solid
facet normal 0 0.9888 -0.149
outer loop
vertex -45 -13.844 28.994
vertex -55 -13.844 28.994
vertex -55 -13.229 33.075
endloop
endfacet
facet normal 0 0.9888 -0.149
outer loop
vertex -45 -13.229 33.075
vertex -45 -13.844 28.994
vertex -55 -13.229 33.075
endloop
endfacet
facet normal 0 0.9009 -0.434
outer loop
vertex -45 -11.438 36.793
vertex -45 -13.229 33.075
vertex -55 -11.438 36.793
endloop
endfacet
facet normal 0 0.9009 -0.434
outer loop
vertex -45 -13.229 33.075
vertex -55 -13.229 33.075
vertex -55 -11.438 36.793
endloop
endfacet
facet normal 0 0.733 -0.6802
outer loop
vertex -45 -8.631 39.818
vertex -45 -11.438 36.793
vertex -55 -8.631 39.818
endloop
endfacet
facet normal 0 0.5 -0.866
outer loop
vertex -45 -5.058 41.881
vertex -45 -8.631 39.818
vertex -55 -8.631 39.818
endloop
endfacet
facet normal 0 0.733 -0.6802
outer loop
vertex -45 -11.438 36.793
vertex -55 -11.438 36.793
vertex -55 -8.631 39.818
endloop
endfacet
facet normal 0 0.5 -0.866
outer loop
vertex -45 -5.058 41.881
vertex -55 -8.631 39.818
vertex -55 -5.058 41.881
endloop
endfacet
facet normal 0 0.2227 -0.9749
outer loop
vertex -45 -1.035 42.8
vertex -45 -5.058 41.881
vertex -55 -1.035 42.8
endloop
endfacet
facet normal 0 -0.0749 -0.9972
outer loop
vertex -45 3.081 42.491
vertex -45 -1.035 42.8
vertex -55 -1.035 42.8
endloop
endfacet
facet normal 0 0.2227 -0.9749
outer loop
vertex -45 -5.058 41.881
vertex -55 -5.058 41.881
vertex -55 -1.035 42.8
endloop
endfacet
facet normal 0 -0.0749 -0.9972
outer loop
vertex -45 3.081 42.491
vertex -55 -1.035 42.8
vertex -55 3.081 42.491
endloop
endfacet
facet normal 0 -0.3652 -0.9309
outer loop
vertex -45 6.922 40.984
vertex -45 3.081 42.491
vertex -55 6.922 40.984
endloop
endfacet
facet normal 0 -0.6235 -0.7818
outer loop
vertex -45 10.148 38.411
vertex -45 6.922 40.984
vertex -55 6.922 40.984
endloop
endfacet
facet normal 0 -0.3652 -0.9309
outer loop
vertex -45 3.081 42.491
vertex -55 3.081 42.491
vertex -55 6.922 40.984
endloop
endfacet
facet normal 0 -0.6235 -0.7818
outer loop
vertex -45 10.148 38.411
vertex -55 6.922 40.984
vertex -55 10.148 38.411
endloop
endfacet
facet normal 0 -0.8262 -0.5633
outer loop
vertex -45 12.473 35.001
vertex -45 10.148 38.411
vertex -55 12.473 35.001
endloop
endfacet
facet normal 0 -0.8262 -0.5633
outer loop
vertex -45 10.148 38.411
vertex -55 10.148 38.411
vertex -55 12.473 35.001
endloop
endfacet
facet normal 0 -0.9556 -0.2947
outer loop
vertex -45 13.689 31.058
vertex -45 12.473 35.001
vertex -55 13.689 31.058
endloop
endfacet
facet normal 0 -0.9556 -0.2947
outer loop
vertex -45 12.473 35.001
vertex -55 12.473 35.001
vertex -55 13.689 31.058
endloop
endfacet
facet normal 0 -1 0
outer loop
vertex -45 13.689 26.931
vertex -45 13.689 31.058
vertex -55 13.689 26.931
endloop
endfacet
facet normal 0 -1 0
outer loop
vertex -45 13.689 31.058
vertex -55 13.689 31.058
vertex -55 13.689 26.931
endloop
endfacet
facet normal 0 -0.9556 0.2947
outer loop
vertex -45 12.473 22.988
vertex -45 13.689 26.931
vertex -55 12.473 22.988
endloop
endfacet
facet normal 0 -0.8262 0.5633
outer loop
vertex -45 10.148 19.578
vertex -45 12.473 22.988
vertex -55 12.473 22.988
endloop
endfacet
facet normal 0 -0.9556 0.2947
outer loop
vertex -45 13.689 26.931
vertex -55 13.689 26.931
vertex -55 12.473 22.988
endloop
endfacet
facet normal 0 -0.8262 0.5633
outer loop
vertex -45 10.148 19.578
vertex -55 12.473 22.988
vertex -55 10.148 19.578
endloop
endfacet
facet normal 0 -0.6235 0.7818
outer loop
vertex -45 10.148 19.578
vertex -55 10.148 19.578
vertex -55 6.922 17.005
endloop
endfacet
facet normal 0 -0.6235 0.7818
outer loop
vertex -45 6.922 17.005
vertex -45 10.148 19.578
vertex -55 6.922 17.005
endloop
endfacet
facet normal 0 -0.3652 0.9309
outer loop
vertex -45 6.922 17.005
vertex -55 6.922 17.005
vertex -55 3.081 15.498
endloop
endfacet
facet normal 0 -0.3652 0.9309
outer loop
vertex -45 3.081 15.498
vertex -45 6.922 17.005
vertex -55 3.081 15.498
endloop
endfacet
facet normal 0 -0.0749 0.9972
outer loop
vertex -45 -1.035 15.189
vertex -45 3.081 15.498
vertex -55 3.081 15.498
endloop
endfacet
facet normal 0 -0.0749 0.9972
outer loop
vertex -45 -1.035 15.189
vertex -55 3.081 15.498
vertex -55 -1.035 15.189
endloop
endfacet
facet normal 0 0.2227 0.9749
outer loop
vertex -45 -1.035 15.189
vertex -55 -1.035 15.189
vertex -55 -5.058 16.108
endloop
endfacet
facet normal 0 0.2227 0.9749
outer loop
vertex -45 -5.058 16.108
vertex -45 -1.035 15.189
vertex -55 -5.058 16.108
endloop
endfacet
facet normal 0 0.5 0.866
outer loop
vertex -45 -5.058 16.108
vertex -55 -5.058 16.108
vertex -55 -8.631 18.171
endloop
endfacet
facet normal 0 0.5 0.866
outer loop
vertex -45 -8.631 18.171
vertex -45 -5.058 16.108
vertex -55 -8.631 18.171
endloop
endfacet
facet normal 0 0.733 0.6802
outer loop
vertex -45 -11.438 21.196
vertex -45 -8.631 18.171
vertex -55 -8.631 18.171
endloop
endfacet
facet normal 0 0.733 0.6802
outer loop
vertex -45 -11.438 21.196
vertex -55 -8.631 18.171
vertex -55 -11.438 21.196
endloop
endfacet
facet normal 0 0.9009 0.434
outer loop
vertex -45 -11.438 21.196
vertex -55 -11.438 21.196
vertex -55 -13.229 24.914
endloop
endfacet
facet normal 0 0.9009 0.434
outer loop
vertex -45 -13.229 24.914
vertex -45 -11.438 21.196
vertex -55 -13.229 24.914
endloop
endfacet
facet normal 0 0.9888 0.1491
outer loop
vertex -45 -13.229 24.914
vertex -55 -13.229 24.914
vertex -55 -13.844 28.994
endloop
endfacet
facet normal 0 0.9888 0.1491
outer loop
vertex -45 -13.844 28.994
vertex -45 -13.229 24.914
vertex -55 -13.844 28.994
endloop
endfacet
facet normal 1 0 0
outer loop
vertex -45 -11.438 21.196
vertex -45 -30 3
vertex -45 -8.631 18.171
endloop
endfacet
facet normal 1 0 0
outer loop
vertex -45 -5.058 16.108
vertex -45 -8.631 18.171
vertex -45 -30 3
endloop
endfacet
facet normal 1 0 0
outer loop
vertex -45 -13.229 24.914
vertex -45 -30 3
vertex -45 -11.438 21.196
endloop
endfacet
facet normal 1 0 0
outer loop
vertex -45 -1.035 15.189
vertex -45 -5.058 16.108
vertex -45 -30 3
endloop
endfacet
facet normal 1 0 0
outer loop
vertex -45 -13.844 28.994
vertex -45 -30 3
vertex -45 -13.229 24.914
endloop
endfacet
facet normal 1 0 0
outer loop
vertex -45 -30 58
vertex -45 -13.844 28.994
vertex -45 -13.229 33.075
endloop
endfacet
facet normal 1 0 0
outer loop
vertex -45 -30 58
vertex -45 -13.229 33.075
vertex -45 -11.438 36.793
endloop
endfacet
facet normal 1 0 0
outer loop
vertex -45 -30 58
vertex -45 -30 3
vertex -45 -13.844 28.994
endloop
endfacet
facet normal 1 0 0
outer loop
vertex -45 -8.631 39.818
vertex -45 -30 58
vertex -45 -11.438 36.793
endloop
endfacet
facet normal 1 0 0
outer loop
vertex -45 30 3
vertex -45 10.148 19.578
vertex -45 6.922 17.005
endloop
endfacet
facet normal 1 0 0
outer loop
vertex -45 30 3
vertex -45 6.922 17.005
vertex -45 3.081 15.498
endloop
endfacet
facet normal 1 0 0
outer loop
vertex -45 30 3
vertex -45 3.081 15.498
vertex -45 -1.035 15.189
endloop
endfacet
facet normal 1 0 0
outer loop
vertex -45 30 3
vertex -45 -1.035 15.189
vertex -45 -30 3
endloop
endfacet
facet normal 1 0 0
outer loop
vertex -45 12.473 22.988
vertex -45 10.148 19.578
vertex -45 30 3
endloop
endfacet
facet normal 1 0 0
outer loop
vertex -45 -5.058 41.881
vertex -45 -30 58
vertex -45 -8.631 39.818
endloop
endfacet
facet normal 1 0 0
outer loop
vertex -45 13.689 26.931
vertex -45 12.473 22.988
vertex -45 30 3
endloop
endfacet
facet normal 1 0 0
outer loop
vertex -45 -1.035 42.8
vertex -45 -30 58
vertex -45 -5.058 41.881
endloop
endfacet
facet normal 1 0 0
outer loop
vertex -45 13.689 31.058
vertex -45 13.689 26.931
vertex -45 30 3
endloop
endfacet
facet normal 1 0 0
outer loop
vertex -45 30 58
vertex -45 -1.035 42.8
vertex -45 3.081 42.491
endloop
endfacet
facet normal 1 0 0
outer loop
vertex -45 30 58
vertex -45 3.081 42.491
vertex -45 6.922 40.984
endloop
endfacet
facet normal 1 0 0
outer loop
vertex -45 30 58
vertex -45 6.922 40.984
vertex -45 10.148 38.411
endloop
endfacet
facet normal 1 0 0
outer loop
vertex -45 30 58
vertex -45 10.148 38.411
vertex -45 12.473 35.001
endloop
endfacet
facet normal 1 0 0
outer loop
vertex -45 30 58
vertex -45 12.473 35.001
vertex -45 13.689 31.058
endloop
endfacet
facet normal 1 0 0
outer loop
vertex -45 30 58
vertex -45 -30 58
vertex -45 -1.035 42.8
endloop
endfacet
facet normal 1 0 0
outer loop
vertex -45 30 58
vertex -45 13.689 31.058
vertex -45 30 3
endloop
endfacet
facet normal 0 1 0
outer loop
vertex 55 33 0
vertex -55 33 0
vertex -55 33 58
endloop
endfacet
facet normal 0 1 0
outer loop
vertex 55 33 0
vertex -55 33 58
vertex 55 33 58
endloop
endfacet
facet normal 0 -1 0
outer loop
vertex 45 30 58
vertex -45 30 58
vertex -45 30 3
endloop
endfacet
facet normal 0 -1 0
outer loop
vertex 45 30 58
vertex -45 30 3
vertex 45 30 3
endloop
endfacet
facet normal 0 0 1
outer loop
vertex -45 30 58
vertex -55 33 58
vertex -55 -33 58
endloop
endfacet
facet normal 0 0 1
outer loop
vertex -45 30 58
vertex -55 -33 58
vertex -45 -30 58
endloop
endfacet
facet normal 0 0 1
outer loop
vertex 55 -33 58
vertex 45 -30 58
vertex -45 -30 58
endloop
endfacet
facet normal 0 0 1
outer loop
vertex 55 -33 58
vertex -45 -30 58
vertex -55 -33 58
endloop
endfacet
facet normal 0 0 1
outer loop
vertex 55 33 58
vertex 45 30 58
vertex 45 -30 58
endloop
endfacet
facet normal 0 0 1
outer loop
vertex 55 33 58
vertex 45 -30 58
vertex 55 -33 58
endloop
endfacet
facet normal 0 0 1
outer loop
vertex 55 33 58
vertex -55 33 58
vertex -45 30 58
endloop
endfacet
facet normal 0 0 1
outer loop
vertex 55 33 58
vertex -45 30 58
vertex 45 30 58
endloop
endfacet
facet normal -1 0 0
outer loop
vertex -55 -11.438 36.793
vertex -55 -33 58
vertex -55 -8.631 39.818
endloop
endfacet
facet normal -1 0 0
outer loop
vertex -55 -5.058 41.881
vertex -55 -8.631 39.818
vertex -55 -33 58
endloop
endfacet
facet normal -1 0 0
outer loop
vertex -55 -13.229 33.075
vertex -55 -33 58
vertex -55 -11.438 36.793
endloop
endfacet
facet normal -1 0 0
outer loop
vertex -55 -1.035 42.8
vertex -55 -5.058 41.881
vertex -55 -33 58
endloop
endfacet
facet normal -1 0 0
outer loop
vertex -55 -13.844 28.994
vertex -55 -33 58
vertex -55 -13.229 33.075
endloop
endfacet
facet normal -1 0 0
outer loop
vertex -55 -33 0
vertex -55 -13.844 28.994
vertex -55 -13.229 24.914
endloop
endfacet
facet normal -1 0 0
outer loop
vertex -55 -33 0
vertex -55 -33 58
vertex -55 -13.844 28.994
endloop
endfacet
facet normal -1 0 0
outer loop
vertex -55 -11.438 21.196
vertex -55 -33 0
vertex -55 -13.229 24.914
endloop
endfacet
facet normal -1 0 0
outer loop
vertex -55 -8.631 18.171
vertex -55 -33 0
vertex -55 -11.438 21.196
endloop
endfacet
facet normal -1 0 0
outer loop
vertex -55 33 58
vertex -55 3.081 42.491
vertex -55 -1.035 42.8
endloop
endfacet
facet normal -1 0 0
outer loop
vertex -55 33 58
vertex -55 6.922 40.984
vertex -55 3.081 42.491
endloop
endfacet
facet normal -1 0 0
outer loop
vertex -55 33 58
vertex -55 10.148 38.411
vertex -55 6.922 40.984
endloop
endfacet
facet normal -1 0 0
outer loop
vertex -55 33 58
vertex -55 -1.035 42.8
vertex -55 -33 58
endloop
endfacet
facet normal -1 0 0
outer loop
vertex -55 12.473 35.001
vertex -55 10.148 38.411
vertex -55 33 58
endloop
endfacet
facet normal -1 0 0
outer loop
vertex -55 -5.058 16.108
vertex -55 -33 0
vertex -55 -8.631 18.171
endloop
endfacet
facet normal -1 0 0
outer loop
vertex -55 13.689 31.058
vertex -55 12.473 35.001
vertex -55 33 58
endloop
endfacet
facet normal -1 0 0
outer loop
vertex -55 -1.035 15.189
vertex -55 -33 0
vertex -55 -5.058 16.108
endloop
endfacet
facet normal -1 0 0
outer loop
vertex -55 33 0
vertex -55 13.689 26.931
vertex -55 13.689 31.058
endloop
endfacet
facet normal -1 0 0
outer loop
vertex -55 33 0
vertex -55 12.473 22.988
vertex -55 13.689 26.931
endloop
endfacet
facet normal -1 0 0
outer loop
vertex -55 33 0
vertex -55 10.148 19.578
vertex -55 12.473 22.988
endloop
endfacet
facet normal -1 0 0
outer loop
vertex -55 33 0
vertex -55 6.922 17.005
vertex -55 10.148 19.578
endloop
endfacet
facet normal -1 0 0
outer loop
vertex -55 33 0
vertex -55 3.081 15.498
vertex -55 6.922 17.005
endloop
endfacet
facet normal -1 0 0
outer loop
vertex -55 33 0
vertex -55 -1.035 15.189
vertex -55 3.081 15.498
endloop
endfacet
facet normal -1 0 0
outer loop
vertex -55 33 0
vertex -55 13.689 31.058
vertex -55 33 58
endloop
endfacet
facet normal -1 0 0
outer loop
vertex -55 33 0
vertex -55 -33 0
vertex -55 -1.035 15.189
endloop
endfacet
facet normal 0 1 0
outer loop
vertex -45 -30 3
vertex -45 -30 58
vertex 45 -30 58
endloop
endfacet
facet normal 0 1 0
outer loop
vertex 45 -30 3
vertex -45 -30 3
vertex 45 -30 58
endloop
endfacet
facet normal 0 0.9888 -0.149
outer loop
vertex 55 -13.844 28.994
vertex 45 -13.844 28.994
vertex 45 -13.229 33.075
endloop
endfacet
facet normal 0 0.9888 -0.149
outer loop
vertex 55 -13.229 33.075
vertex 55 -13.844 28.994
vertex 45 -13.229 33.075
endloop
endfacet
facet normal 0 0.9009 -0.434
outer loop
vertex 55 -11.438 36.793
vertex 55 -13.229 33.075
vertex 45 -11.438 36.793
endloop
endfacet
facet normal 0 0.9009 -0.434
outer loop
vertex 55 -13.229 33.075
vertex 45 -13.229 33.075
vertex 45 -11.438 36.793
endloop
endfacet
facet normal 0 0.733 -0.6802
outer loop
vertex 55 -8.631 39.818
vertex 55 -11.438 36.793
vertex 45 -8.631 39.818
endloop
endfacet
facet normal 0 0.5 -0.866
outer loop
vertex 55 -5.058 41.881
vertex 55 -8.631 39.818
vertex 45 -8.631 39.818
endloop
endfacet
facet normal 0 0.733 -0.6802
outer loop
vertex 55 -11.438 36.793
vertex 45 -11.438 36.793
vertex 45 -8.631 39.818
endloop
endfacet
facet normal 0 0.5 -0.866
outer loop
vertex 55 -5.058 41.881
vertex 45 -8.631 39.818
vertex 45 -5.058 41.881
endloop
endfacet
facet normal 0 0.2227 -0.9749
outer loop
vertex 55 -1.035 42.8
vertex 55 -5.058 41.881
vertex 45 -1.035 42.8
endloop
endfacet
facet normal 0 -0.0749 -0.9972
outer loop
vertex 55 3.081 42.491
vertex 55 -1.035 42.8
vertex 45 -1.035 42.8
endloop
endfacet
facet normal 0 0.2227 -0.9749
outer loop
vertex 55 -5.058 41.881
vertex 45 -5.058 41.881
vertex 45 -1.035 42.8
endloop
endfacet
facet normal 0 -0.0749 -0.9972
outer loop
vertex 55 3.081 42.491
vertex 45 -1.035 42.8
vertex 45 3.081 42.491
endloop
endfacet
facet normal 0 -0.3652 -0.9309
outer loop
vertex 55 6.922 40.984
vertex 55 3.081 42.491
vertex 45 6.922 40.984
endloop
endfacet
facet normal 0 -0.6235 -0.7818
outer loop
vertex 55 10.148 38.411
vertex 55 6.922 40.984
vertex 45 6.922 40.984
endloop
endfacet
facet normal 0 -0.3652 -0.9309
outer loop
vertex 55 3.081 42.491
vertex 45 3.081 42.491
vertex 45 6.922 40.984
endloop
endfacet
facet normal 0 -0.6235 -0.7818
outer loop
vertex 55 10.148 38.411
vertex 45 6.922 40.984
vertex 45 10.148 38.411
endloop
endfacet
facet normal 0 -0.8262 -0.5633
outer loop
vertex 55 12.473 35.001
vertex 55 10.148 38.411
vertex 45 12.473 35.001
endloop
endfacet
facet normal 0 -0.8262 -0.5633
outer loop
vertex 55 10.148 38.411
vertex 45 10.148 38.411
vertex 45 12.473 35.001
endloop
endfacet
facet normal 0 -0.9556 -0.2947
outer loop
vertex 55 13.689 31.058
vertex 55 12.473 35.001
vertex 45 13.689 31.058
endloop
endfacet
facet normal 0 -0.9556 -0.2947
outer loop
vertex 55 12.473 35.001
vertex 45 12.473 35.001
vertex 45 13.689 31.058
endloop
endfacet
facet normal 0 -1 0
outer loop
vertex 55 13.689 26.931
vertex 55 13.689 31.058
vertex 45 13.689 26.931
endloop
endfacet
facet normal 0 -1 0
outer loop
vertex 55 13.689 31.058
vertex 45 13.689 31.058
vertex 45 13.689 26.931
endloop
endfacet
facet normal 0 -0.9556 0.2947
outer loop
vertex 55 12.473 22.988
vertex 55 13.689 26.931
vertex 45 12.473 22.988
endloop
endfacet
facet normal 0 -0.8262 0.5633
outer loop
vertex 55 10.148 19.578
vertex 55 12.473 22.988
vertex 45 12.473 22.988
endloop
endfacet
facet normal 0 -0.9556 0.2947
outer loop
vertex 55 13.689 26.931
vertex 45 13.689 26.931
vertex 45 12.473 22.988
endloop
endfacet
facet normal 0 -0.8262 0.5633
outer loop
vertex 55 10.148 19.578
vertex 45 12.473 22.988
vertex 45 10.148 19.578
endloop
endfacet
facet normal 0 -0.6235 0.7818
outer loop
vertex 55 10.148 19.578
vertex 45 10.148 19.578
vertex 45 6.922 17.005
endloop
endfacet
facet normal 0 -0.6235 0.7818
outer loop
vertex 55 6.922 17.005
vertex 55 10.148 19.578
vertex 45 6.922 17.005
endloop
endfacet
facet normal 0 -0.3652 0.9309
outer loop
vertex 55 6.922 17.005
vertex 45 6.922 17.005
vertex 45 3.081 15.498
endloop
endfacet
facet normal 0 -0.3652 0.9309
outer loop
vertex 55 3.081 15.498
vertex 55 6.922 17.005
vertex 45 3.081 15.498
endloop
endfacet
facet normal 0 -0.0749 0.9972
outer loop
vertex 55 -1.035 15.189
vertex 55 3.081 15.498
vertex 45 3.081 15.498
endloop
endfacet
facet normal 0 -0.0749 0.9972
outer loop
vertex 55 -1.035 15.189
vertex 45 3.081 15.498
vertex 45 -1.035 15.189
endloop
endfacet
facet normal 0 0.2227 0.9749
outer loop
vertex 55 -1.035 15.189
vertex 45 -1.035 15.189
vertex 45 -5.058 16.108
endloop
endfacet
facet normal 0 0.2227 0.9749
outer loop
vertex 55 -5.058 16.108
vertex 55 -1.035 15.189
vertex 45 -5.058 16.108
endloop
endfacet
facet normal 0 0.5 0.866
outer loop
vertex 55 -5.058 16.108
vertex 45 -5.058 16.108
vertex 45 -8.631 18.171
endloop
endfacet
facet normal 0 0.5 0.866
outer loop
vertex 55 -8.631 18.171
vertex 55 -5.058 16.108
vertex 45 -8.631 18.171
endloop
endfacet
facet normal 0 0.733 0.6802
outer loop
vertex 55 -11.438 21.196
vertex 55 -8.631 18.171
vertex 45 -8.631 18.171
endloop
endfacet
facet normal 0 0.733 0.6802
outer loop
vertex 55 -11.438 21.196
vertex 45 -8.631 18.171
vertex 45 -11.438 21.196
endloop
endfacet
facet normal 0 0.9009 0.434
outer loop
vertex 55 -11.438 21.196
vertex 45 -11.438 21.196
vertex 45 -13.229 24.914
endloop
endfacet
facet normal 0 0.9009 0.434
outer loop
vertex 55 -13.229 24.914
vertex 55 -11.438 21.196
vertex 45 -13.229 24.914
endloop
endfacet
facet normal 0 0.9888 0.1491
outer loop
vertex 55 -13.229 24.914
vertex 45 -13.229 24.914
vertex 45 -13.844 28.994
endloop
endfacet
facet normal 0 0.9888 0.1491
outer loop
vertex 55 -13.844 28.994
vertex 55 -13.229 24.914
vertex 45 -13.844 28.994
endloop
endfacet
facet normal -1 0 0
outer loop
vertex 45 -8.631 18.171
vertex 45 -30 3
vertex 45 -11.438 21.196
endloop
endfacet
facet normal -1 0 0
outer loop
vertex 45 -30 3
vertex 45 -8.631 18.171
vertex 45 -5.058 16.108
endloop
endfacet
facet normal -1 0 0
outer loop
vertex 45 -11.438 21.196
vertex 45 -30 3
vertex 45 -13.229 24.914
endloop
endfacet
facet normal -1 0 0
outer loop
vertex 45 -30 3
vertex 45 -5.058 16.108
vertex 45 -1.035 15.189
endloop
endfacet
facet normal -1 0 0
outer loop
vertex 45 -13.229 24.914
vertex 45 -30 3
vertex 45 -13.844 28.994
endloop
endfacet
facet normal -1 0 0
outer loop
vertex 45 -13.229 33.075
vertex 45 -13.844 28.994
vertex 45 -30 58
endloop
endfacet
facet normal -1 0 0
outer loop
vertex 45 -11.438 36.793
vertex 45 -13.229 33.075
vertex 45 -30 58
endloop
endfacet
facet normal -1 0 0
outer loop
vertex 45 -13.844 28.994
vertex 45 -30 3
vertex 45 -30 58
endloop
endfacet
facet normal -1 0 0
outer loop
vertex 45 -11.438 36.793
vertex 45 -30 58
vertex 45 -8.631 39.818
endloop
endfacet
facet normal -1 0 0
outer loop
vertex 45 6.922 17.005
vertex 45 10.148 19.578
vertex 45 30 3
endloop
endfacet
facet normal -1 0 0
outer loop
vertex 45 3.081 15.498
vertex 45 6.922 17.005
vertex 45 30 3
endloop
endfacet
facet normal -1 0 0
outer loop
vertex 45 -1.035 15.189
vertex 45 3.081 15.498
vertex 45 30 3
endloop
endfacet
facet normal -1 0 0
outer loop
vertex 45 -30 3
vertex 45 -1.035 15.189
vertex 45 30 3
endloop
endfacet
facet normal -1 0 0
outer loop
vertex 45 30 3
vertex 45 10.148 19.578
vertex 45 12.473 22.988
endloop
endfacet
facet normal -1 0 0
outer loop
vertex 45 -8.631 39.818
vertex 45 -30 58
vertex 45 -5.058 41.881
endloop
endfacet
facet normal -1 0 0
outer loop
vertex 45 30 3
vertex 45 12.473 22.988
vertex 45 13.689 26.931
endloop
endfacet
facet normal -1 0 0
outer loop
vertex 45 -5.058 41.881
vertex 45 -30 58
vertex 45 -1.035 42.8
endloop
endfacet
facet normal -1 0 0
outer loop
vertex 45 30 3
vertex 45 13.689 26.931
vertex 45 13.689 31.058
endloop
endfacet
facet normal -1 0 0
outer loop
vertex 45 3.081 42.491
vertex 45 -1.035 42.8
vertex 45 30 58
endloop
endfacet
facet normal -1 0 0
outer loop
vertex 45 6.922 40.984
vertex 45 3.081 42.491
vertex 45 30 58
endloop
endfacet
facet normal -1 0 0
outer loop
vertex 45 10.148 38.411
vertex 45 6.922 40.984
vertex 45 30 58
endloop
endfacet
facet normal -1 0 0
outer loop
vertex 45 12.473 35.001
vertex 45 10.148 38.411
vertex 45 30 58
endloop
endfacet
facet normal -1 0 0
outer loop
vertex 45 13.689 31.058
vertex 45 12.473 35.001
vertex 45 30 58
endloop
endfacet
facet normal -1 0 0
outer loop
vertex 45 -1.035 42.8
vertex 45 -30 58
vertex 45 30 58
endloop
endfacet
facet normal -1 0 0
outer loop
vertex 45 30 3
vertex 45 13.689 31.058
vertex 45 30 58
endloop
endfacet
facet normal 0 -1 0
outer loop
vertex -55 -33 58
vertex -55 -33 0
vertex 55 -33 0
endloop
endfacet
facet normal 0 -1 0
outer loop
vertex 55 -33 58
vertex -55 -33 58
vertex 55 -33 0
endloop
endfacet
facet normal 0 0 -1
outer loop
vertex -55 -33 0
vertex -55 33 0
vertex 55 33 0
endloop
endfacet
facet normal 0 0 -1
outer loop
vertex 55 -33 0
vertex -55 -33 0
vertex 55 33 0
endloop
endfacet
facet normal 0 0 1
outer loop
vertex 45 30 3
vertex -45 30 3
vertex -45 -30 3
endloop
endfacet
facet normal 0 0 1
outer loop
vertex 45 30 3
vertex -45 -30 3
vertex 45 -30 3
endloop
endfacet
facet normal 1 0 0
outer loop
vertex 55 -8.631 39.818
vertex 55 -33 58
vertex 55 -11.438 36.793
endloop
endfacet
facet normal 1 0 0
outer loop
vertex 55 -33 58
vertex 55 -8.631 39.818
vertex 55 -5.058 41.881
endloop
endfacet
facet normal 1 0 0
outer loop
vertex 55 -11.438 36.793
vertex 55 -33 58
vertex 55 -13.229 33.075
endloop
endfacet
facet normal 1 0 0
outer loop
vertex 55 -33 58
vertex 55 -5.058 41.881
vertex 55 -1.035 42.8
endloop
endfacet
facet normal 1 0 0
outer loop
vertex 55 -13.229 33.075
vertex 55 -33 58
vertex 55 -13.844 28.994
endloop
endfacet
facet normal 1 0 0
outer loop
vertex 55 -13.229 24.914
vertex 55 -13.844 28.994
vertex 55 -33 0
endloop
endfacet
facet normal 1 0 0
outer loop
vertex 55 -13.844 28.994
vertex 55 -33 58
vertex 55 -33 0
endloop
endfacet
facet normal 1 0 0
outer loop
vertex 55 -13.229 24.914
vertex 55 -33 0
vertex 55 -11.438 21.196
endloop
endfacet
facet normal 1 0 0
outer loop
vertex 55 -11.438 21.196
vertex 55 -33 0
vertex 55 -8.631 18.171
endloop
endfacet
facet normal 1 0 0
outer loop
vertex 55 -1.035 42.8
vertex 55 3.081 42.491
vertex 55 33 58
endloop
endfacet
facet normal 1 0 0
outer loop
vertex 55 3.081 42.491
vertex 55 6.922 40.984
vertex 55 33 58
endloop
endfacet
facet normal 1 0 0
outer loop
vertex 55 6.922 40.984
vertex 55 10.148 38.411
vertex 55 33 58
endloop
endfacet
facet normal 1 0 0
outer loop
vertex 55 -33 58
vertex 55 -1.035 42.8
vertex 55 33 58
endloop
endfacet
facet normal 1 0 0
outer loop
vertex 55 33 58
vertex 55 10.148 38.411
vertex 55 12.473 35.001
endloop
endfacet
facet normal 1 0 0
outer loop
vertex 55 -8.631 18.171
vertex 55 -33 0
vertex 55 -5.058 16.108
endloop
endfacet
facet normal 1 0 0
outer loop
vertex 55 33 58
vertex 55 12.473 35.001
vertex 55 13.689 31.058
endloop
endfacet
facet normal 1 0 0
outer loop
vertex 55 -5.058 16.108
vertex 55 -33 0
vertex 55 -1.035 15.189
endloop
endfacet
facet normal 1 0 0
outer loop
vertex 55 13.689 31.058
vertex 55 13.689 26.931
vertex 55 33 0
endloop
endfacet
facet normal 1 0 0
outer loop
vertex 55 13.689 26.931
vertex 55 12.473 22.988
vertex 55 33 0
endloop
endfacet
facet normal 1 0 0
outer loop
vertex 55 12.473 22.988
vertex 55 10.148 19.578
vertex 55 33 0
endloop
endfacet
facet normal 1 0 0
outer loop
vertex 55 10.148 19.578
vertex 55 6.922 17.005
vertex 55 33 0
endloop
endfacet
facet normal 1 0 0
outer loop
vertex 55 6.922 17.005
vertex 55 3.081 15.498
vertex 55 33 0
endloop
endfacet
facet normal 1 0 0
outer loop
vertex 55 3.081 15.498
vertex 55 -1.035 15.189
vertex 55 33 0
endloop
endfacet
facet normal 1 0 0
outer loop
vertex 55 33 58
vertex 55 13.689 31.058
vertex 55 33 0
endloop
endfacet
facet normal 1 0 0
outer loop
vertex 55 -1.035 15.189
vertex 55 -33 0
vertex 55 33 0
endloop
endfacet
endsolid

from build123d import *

# Parameters (mm, degrees)
F0_W     = 110
F0_H     = 66
F1_DEPTH = 58
F2_W     = 90
F2_H     = 60
F3_DEPTH = 55
F5_R     = 13.843831
F6_DEPTH = 115


with BuildPart() as f1:
    # F0 (on Top) → F1 (new body)
    with BuildSketch(Plane.XY):
        Rectangle(F0_W, F0_H)
    extrude(amount=F1_DEPTH)

    # F2 (on face) → F3 (cut)
    with BuildSketch(Plane.XY.offset(58)):
        Rectangle(F2_W, F2_H)
    extrude(amount=-F3_DEPTH, mode=Mode.SUBTRACT)

    # F5 (on face) → F6 (cut)
    with BuildSketch(Plane(origin=(-55, 0, 0), x_dir=(0, -1, 0), z_dir=(-1, 0, 0))):
        with Locations((0, 28.994452)):
            Circle(F5_R)
    extrude(amount=-F6_DEPTH, mode=Mode.SUBTRACT)


solid = f1.part
